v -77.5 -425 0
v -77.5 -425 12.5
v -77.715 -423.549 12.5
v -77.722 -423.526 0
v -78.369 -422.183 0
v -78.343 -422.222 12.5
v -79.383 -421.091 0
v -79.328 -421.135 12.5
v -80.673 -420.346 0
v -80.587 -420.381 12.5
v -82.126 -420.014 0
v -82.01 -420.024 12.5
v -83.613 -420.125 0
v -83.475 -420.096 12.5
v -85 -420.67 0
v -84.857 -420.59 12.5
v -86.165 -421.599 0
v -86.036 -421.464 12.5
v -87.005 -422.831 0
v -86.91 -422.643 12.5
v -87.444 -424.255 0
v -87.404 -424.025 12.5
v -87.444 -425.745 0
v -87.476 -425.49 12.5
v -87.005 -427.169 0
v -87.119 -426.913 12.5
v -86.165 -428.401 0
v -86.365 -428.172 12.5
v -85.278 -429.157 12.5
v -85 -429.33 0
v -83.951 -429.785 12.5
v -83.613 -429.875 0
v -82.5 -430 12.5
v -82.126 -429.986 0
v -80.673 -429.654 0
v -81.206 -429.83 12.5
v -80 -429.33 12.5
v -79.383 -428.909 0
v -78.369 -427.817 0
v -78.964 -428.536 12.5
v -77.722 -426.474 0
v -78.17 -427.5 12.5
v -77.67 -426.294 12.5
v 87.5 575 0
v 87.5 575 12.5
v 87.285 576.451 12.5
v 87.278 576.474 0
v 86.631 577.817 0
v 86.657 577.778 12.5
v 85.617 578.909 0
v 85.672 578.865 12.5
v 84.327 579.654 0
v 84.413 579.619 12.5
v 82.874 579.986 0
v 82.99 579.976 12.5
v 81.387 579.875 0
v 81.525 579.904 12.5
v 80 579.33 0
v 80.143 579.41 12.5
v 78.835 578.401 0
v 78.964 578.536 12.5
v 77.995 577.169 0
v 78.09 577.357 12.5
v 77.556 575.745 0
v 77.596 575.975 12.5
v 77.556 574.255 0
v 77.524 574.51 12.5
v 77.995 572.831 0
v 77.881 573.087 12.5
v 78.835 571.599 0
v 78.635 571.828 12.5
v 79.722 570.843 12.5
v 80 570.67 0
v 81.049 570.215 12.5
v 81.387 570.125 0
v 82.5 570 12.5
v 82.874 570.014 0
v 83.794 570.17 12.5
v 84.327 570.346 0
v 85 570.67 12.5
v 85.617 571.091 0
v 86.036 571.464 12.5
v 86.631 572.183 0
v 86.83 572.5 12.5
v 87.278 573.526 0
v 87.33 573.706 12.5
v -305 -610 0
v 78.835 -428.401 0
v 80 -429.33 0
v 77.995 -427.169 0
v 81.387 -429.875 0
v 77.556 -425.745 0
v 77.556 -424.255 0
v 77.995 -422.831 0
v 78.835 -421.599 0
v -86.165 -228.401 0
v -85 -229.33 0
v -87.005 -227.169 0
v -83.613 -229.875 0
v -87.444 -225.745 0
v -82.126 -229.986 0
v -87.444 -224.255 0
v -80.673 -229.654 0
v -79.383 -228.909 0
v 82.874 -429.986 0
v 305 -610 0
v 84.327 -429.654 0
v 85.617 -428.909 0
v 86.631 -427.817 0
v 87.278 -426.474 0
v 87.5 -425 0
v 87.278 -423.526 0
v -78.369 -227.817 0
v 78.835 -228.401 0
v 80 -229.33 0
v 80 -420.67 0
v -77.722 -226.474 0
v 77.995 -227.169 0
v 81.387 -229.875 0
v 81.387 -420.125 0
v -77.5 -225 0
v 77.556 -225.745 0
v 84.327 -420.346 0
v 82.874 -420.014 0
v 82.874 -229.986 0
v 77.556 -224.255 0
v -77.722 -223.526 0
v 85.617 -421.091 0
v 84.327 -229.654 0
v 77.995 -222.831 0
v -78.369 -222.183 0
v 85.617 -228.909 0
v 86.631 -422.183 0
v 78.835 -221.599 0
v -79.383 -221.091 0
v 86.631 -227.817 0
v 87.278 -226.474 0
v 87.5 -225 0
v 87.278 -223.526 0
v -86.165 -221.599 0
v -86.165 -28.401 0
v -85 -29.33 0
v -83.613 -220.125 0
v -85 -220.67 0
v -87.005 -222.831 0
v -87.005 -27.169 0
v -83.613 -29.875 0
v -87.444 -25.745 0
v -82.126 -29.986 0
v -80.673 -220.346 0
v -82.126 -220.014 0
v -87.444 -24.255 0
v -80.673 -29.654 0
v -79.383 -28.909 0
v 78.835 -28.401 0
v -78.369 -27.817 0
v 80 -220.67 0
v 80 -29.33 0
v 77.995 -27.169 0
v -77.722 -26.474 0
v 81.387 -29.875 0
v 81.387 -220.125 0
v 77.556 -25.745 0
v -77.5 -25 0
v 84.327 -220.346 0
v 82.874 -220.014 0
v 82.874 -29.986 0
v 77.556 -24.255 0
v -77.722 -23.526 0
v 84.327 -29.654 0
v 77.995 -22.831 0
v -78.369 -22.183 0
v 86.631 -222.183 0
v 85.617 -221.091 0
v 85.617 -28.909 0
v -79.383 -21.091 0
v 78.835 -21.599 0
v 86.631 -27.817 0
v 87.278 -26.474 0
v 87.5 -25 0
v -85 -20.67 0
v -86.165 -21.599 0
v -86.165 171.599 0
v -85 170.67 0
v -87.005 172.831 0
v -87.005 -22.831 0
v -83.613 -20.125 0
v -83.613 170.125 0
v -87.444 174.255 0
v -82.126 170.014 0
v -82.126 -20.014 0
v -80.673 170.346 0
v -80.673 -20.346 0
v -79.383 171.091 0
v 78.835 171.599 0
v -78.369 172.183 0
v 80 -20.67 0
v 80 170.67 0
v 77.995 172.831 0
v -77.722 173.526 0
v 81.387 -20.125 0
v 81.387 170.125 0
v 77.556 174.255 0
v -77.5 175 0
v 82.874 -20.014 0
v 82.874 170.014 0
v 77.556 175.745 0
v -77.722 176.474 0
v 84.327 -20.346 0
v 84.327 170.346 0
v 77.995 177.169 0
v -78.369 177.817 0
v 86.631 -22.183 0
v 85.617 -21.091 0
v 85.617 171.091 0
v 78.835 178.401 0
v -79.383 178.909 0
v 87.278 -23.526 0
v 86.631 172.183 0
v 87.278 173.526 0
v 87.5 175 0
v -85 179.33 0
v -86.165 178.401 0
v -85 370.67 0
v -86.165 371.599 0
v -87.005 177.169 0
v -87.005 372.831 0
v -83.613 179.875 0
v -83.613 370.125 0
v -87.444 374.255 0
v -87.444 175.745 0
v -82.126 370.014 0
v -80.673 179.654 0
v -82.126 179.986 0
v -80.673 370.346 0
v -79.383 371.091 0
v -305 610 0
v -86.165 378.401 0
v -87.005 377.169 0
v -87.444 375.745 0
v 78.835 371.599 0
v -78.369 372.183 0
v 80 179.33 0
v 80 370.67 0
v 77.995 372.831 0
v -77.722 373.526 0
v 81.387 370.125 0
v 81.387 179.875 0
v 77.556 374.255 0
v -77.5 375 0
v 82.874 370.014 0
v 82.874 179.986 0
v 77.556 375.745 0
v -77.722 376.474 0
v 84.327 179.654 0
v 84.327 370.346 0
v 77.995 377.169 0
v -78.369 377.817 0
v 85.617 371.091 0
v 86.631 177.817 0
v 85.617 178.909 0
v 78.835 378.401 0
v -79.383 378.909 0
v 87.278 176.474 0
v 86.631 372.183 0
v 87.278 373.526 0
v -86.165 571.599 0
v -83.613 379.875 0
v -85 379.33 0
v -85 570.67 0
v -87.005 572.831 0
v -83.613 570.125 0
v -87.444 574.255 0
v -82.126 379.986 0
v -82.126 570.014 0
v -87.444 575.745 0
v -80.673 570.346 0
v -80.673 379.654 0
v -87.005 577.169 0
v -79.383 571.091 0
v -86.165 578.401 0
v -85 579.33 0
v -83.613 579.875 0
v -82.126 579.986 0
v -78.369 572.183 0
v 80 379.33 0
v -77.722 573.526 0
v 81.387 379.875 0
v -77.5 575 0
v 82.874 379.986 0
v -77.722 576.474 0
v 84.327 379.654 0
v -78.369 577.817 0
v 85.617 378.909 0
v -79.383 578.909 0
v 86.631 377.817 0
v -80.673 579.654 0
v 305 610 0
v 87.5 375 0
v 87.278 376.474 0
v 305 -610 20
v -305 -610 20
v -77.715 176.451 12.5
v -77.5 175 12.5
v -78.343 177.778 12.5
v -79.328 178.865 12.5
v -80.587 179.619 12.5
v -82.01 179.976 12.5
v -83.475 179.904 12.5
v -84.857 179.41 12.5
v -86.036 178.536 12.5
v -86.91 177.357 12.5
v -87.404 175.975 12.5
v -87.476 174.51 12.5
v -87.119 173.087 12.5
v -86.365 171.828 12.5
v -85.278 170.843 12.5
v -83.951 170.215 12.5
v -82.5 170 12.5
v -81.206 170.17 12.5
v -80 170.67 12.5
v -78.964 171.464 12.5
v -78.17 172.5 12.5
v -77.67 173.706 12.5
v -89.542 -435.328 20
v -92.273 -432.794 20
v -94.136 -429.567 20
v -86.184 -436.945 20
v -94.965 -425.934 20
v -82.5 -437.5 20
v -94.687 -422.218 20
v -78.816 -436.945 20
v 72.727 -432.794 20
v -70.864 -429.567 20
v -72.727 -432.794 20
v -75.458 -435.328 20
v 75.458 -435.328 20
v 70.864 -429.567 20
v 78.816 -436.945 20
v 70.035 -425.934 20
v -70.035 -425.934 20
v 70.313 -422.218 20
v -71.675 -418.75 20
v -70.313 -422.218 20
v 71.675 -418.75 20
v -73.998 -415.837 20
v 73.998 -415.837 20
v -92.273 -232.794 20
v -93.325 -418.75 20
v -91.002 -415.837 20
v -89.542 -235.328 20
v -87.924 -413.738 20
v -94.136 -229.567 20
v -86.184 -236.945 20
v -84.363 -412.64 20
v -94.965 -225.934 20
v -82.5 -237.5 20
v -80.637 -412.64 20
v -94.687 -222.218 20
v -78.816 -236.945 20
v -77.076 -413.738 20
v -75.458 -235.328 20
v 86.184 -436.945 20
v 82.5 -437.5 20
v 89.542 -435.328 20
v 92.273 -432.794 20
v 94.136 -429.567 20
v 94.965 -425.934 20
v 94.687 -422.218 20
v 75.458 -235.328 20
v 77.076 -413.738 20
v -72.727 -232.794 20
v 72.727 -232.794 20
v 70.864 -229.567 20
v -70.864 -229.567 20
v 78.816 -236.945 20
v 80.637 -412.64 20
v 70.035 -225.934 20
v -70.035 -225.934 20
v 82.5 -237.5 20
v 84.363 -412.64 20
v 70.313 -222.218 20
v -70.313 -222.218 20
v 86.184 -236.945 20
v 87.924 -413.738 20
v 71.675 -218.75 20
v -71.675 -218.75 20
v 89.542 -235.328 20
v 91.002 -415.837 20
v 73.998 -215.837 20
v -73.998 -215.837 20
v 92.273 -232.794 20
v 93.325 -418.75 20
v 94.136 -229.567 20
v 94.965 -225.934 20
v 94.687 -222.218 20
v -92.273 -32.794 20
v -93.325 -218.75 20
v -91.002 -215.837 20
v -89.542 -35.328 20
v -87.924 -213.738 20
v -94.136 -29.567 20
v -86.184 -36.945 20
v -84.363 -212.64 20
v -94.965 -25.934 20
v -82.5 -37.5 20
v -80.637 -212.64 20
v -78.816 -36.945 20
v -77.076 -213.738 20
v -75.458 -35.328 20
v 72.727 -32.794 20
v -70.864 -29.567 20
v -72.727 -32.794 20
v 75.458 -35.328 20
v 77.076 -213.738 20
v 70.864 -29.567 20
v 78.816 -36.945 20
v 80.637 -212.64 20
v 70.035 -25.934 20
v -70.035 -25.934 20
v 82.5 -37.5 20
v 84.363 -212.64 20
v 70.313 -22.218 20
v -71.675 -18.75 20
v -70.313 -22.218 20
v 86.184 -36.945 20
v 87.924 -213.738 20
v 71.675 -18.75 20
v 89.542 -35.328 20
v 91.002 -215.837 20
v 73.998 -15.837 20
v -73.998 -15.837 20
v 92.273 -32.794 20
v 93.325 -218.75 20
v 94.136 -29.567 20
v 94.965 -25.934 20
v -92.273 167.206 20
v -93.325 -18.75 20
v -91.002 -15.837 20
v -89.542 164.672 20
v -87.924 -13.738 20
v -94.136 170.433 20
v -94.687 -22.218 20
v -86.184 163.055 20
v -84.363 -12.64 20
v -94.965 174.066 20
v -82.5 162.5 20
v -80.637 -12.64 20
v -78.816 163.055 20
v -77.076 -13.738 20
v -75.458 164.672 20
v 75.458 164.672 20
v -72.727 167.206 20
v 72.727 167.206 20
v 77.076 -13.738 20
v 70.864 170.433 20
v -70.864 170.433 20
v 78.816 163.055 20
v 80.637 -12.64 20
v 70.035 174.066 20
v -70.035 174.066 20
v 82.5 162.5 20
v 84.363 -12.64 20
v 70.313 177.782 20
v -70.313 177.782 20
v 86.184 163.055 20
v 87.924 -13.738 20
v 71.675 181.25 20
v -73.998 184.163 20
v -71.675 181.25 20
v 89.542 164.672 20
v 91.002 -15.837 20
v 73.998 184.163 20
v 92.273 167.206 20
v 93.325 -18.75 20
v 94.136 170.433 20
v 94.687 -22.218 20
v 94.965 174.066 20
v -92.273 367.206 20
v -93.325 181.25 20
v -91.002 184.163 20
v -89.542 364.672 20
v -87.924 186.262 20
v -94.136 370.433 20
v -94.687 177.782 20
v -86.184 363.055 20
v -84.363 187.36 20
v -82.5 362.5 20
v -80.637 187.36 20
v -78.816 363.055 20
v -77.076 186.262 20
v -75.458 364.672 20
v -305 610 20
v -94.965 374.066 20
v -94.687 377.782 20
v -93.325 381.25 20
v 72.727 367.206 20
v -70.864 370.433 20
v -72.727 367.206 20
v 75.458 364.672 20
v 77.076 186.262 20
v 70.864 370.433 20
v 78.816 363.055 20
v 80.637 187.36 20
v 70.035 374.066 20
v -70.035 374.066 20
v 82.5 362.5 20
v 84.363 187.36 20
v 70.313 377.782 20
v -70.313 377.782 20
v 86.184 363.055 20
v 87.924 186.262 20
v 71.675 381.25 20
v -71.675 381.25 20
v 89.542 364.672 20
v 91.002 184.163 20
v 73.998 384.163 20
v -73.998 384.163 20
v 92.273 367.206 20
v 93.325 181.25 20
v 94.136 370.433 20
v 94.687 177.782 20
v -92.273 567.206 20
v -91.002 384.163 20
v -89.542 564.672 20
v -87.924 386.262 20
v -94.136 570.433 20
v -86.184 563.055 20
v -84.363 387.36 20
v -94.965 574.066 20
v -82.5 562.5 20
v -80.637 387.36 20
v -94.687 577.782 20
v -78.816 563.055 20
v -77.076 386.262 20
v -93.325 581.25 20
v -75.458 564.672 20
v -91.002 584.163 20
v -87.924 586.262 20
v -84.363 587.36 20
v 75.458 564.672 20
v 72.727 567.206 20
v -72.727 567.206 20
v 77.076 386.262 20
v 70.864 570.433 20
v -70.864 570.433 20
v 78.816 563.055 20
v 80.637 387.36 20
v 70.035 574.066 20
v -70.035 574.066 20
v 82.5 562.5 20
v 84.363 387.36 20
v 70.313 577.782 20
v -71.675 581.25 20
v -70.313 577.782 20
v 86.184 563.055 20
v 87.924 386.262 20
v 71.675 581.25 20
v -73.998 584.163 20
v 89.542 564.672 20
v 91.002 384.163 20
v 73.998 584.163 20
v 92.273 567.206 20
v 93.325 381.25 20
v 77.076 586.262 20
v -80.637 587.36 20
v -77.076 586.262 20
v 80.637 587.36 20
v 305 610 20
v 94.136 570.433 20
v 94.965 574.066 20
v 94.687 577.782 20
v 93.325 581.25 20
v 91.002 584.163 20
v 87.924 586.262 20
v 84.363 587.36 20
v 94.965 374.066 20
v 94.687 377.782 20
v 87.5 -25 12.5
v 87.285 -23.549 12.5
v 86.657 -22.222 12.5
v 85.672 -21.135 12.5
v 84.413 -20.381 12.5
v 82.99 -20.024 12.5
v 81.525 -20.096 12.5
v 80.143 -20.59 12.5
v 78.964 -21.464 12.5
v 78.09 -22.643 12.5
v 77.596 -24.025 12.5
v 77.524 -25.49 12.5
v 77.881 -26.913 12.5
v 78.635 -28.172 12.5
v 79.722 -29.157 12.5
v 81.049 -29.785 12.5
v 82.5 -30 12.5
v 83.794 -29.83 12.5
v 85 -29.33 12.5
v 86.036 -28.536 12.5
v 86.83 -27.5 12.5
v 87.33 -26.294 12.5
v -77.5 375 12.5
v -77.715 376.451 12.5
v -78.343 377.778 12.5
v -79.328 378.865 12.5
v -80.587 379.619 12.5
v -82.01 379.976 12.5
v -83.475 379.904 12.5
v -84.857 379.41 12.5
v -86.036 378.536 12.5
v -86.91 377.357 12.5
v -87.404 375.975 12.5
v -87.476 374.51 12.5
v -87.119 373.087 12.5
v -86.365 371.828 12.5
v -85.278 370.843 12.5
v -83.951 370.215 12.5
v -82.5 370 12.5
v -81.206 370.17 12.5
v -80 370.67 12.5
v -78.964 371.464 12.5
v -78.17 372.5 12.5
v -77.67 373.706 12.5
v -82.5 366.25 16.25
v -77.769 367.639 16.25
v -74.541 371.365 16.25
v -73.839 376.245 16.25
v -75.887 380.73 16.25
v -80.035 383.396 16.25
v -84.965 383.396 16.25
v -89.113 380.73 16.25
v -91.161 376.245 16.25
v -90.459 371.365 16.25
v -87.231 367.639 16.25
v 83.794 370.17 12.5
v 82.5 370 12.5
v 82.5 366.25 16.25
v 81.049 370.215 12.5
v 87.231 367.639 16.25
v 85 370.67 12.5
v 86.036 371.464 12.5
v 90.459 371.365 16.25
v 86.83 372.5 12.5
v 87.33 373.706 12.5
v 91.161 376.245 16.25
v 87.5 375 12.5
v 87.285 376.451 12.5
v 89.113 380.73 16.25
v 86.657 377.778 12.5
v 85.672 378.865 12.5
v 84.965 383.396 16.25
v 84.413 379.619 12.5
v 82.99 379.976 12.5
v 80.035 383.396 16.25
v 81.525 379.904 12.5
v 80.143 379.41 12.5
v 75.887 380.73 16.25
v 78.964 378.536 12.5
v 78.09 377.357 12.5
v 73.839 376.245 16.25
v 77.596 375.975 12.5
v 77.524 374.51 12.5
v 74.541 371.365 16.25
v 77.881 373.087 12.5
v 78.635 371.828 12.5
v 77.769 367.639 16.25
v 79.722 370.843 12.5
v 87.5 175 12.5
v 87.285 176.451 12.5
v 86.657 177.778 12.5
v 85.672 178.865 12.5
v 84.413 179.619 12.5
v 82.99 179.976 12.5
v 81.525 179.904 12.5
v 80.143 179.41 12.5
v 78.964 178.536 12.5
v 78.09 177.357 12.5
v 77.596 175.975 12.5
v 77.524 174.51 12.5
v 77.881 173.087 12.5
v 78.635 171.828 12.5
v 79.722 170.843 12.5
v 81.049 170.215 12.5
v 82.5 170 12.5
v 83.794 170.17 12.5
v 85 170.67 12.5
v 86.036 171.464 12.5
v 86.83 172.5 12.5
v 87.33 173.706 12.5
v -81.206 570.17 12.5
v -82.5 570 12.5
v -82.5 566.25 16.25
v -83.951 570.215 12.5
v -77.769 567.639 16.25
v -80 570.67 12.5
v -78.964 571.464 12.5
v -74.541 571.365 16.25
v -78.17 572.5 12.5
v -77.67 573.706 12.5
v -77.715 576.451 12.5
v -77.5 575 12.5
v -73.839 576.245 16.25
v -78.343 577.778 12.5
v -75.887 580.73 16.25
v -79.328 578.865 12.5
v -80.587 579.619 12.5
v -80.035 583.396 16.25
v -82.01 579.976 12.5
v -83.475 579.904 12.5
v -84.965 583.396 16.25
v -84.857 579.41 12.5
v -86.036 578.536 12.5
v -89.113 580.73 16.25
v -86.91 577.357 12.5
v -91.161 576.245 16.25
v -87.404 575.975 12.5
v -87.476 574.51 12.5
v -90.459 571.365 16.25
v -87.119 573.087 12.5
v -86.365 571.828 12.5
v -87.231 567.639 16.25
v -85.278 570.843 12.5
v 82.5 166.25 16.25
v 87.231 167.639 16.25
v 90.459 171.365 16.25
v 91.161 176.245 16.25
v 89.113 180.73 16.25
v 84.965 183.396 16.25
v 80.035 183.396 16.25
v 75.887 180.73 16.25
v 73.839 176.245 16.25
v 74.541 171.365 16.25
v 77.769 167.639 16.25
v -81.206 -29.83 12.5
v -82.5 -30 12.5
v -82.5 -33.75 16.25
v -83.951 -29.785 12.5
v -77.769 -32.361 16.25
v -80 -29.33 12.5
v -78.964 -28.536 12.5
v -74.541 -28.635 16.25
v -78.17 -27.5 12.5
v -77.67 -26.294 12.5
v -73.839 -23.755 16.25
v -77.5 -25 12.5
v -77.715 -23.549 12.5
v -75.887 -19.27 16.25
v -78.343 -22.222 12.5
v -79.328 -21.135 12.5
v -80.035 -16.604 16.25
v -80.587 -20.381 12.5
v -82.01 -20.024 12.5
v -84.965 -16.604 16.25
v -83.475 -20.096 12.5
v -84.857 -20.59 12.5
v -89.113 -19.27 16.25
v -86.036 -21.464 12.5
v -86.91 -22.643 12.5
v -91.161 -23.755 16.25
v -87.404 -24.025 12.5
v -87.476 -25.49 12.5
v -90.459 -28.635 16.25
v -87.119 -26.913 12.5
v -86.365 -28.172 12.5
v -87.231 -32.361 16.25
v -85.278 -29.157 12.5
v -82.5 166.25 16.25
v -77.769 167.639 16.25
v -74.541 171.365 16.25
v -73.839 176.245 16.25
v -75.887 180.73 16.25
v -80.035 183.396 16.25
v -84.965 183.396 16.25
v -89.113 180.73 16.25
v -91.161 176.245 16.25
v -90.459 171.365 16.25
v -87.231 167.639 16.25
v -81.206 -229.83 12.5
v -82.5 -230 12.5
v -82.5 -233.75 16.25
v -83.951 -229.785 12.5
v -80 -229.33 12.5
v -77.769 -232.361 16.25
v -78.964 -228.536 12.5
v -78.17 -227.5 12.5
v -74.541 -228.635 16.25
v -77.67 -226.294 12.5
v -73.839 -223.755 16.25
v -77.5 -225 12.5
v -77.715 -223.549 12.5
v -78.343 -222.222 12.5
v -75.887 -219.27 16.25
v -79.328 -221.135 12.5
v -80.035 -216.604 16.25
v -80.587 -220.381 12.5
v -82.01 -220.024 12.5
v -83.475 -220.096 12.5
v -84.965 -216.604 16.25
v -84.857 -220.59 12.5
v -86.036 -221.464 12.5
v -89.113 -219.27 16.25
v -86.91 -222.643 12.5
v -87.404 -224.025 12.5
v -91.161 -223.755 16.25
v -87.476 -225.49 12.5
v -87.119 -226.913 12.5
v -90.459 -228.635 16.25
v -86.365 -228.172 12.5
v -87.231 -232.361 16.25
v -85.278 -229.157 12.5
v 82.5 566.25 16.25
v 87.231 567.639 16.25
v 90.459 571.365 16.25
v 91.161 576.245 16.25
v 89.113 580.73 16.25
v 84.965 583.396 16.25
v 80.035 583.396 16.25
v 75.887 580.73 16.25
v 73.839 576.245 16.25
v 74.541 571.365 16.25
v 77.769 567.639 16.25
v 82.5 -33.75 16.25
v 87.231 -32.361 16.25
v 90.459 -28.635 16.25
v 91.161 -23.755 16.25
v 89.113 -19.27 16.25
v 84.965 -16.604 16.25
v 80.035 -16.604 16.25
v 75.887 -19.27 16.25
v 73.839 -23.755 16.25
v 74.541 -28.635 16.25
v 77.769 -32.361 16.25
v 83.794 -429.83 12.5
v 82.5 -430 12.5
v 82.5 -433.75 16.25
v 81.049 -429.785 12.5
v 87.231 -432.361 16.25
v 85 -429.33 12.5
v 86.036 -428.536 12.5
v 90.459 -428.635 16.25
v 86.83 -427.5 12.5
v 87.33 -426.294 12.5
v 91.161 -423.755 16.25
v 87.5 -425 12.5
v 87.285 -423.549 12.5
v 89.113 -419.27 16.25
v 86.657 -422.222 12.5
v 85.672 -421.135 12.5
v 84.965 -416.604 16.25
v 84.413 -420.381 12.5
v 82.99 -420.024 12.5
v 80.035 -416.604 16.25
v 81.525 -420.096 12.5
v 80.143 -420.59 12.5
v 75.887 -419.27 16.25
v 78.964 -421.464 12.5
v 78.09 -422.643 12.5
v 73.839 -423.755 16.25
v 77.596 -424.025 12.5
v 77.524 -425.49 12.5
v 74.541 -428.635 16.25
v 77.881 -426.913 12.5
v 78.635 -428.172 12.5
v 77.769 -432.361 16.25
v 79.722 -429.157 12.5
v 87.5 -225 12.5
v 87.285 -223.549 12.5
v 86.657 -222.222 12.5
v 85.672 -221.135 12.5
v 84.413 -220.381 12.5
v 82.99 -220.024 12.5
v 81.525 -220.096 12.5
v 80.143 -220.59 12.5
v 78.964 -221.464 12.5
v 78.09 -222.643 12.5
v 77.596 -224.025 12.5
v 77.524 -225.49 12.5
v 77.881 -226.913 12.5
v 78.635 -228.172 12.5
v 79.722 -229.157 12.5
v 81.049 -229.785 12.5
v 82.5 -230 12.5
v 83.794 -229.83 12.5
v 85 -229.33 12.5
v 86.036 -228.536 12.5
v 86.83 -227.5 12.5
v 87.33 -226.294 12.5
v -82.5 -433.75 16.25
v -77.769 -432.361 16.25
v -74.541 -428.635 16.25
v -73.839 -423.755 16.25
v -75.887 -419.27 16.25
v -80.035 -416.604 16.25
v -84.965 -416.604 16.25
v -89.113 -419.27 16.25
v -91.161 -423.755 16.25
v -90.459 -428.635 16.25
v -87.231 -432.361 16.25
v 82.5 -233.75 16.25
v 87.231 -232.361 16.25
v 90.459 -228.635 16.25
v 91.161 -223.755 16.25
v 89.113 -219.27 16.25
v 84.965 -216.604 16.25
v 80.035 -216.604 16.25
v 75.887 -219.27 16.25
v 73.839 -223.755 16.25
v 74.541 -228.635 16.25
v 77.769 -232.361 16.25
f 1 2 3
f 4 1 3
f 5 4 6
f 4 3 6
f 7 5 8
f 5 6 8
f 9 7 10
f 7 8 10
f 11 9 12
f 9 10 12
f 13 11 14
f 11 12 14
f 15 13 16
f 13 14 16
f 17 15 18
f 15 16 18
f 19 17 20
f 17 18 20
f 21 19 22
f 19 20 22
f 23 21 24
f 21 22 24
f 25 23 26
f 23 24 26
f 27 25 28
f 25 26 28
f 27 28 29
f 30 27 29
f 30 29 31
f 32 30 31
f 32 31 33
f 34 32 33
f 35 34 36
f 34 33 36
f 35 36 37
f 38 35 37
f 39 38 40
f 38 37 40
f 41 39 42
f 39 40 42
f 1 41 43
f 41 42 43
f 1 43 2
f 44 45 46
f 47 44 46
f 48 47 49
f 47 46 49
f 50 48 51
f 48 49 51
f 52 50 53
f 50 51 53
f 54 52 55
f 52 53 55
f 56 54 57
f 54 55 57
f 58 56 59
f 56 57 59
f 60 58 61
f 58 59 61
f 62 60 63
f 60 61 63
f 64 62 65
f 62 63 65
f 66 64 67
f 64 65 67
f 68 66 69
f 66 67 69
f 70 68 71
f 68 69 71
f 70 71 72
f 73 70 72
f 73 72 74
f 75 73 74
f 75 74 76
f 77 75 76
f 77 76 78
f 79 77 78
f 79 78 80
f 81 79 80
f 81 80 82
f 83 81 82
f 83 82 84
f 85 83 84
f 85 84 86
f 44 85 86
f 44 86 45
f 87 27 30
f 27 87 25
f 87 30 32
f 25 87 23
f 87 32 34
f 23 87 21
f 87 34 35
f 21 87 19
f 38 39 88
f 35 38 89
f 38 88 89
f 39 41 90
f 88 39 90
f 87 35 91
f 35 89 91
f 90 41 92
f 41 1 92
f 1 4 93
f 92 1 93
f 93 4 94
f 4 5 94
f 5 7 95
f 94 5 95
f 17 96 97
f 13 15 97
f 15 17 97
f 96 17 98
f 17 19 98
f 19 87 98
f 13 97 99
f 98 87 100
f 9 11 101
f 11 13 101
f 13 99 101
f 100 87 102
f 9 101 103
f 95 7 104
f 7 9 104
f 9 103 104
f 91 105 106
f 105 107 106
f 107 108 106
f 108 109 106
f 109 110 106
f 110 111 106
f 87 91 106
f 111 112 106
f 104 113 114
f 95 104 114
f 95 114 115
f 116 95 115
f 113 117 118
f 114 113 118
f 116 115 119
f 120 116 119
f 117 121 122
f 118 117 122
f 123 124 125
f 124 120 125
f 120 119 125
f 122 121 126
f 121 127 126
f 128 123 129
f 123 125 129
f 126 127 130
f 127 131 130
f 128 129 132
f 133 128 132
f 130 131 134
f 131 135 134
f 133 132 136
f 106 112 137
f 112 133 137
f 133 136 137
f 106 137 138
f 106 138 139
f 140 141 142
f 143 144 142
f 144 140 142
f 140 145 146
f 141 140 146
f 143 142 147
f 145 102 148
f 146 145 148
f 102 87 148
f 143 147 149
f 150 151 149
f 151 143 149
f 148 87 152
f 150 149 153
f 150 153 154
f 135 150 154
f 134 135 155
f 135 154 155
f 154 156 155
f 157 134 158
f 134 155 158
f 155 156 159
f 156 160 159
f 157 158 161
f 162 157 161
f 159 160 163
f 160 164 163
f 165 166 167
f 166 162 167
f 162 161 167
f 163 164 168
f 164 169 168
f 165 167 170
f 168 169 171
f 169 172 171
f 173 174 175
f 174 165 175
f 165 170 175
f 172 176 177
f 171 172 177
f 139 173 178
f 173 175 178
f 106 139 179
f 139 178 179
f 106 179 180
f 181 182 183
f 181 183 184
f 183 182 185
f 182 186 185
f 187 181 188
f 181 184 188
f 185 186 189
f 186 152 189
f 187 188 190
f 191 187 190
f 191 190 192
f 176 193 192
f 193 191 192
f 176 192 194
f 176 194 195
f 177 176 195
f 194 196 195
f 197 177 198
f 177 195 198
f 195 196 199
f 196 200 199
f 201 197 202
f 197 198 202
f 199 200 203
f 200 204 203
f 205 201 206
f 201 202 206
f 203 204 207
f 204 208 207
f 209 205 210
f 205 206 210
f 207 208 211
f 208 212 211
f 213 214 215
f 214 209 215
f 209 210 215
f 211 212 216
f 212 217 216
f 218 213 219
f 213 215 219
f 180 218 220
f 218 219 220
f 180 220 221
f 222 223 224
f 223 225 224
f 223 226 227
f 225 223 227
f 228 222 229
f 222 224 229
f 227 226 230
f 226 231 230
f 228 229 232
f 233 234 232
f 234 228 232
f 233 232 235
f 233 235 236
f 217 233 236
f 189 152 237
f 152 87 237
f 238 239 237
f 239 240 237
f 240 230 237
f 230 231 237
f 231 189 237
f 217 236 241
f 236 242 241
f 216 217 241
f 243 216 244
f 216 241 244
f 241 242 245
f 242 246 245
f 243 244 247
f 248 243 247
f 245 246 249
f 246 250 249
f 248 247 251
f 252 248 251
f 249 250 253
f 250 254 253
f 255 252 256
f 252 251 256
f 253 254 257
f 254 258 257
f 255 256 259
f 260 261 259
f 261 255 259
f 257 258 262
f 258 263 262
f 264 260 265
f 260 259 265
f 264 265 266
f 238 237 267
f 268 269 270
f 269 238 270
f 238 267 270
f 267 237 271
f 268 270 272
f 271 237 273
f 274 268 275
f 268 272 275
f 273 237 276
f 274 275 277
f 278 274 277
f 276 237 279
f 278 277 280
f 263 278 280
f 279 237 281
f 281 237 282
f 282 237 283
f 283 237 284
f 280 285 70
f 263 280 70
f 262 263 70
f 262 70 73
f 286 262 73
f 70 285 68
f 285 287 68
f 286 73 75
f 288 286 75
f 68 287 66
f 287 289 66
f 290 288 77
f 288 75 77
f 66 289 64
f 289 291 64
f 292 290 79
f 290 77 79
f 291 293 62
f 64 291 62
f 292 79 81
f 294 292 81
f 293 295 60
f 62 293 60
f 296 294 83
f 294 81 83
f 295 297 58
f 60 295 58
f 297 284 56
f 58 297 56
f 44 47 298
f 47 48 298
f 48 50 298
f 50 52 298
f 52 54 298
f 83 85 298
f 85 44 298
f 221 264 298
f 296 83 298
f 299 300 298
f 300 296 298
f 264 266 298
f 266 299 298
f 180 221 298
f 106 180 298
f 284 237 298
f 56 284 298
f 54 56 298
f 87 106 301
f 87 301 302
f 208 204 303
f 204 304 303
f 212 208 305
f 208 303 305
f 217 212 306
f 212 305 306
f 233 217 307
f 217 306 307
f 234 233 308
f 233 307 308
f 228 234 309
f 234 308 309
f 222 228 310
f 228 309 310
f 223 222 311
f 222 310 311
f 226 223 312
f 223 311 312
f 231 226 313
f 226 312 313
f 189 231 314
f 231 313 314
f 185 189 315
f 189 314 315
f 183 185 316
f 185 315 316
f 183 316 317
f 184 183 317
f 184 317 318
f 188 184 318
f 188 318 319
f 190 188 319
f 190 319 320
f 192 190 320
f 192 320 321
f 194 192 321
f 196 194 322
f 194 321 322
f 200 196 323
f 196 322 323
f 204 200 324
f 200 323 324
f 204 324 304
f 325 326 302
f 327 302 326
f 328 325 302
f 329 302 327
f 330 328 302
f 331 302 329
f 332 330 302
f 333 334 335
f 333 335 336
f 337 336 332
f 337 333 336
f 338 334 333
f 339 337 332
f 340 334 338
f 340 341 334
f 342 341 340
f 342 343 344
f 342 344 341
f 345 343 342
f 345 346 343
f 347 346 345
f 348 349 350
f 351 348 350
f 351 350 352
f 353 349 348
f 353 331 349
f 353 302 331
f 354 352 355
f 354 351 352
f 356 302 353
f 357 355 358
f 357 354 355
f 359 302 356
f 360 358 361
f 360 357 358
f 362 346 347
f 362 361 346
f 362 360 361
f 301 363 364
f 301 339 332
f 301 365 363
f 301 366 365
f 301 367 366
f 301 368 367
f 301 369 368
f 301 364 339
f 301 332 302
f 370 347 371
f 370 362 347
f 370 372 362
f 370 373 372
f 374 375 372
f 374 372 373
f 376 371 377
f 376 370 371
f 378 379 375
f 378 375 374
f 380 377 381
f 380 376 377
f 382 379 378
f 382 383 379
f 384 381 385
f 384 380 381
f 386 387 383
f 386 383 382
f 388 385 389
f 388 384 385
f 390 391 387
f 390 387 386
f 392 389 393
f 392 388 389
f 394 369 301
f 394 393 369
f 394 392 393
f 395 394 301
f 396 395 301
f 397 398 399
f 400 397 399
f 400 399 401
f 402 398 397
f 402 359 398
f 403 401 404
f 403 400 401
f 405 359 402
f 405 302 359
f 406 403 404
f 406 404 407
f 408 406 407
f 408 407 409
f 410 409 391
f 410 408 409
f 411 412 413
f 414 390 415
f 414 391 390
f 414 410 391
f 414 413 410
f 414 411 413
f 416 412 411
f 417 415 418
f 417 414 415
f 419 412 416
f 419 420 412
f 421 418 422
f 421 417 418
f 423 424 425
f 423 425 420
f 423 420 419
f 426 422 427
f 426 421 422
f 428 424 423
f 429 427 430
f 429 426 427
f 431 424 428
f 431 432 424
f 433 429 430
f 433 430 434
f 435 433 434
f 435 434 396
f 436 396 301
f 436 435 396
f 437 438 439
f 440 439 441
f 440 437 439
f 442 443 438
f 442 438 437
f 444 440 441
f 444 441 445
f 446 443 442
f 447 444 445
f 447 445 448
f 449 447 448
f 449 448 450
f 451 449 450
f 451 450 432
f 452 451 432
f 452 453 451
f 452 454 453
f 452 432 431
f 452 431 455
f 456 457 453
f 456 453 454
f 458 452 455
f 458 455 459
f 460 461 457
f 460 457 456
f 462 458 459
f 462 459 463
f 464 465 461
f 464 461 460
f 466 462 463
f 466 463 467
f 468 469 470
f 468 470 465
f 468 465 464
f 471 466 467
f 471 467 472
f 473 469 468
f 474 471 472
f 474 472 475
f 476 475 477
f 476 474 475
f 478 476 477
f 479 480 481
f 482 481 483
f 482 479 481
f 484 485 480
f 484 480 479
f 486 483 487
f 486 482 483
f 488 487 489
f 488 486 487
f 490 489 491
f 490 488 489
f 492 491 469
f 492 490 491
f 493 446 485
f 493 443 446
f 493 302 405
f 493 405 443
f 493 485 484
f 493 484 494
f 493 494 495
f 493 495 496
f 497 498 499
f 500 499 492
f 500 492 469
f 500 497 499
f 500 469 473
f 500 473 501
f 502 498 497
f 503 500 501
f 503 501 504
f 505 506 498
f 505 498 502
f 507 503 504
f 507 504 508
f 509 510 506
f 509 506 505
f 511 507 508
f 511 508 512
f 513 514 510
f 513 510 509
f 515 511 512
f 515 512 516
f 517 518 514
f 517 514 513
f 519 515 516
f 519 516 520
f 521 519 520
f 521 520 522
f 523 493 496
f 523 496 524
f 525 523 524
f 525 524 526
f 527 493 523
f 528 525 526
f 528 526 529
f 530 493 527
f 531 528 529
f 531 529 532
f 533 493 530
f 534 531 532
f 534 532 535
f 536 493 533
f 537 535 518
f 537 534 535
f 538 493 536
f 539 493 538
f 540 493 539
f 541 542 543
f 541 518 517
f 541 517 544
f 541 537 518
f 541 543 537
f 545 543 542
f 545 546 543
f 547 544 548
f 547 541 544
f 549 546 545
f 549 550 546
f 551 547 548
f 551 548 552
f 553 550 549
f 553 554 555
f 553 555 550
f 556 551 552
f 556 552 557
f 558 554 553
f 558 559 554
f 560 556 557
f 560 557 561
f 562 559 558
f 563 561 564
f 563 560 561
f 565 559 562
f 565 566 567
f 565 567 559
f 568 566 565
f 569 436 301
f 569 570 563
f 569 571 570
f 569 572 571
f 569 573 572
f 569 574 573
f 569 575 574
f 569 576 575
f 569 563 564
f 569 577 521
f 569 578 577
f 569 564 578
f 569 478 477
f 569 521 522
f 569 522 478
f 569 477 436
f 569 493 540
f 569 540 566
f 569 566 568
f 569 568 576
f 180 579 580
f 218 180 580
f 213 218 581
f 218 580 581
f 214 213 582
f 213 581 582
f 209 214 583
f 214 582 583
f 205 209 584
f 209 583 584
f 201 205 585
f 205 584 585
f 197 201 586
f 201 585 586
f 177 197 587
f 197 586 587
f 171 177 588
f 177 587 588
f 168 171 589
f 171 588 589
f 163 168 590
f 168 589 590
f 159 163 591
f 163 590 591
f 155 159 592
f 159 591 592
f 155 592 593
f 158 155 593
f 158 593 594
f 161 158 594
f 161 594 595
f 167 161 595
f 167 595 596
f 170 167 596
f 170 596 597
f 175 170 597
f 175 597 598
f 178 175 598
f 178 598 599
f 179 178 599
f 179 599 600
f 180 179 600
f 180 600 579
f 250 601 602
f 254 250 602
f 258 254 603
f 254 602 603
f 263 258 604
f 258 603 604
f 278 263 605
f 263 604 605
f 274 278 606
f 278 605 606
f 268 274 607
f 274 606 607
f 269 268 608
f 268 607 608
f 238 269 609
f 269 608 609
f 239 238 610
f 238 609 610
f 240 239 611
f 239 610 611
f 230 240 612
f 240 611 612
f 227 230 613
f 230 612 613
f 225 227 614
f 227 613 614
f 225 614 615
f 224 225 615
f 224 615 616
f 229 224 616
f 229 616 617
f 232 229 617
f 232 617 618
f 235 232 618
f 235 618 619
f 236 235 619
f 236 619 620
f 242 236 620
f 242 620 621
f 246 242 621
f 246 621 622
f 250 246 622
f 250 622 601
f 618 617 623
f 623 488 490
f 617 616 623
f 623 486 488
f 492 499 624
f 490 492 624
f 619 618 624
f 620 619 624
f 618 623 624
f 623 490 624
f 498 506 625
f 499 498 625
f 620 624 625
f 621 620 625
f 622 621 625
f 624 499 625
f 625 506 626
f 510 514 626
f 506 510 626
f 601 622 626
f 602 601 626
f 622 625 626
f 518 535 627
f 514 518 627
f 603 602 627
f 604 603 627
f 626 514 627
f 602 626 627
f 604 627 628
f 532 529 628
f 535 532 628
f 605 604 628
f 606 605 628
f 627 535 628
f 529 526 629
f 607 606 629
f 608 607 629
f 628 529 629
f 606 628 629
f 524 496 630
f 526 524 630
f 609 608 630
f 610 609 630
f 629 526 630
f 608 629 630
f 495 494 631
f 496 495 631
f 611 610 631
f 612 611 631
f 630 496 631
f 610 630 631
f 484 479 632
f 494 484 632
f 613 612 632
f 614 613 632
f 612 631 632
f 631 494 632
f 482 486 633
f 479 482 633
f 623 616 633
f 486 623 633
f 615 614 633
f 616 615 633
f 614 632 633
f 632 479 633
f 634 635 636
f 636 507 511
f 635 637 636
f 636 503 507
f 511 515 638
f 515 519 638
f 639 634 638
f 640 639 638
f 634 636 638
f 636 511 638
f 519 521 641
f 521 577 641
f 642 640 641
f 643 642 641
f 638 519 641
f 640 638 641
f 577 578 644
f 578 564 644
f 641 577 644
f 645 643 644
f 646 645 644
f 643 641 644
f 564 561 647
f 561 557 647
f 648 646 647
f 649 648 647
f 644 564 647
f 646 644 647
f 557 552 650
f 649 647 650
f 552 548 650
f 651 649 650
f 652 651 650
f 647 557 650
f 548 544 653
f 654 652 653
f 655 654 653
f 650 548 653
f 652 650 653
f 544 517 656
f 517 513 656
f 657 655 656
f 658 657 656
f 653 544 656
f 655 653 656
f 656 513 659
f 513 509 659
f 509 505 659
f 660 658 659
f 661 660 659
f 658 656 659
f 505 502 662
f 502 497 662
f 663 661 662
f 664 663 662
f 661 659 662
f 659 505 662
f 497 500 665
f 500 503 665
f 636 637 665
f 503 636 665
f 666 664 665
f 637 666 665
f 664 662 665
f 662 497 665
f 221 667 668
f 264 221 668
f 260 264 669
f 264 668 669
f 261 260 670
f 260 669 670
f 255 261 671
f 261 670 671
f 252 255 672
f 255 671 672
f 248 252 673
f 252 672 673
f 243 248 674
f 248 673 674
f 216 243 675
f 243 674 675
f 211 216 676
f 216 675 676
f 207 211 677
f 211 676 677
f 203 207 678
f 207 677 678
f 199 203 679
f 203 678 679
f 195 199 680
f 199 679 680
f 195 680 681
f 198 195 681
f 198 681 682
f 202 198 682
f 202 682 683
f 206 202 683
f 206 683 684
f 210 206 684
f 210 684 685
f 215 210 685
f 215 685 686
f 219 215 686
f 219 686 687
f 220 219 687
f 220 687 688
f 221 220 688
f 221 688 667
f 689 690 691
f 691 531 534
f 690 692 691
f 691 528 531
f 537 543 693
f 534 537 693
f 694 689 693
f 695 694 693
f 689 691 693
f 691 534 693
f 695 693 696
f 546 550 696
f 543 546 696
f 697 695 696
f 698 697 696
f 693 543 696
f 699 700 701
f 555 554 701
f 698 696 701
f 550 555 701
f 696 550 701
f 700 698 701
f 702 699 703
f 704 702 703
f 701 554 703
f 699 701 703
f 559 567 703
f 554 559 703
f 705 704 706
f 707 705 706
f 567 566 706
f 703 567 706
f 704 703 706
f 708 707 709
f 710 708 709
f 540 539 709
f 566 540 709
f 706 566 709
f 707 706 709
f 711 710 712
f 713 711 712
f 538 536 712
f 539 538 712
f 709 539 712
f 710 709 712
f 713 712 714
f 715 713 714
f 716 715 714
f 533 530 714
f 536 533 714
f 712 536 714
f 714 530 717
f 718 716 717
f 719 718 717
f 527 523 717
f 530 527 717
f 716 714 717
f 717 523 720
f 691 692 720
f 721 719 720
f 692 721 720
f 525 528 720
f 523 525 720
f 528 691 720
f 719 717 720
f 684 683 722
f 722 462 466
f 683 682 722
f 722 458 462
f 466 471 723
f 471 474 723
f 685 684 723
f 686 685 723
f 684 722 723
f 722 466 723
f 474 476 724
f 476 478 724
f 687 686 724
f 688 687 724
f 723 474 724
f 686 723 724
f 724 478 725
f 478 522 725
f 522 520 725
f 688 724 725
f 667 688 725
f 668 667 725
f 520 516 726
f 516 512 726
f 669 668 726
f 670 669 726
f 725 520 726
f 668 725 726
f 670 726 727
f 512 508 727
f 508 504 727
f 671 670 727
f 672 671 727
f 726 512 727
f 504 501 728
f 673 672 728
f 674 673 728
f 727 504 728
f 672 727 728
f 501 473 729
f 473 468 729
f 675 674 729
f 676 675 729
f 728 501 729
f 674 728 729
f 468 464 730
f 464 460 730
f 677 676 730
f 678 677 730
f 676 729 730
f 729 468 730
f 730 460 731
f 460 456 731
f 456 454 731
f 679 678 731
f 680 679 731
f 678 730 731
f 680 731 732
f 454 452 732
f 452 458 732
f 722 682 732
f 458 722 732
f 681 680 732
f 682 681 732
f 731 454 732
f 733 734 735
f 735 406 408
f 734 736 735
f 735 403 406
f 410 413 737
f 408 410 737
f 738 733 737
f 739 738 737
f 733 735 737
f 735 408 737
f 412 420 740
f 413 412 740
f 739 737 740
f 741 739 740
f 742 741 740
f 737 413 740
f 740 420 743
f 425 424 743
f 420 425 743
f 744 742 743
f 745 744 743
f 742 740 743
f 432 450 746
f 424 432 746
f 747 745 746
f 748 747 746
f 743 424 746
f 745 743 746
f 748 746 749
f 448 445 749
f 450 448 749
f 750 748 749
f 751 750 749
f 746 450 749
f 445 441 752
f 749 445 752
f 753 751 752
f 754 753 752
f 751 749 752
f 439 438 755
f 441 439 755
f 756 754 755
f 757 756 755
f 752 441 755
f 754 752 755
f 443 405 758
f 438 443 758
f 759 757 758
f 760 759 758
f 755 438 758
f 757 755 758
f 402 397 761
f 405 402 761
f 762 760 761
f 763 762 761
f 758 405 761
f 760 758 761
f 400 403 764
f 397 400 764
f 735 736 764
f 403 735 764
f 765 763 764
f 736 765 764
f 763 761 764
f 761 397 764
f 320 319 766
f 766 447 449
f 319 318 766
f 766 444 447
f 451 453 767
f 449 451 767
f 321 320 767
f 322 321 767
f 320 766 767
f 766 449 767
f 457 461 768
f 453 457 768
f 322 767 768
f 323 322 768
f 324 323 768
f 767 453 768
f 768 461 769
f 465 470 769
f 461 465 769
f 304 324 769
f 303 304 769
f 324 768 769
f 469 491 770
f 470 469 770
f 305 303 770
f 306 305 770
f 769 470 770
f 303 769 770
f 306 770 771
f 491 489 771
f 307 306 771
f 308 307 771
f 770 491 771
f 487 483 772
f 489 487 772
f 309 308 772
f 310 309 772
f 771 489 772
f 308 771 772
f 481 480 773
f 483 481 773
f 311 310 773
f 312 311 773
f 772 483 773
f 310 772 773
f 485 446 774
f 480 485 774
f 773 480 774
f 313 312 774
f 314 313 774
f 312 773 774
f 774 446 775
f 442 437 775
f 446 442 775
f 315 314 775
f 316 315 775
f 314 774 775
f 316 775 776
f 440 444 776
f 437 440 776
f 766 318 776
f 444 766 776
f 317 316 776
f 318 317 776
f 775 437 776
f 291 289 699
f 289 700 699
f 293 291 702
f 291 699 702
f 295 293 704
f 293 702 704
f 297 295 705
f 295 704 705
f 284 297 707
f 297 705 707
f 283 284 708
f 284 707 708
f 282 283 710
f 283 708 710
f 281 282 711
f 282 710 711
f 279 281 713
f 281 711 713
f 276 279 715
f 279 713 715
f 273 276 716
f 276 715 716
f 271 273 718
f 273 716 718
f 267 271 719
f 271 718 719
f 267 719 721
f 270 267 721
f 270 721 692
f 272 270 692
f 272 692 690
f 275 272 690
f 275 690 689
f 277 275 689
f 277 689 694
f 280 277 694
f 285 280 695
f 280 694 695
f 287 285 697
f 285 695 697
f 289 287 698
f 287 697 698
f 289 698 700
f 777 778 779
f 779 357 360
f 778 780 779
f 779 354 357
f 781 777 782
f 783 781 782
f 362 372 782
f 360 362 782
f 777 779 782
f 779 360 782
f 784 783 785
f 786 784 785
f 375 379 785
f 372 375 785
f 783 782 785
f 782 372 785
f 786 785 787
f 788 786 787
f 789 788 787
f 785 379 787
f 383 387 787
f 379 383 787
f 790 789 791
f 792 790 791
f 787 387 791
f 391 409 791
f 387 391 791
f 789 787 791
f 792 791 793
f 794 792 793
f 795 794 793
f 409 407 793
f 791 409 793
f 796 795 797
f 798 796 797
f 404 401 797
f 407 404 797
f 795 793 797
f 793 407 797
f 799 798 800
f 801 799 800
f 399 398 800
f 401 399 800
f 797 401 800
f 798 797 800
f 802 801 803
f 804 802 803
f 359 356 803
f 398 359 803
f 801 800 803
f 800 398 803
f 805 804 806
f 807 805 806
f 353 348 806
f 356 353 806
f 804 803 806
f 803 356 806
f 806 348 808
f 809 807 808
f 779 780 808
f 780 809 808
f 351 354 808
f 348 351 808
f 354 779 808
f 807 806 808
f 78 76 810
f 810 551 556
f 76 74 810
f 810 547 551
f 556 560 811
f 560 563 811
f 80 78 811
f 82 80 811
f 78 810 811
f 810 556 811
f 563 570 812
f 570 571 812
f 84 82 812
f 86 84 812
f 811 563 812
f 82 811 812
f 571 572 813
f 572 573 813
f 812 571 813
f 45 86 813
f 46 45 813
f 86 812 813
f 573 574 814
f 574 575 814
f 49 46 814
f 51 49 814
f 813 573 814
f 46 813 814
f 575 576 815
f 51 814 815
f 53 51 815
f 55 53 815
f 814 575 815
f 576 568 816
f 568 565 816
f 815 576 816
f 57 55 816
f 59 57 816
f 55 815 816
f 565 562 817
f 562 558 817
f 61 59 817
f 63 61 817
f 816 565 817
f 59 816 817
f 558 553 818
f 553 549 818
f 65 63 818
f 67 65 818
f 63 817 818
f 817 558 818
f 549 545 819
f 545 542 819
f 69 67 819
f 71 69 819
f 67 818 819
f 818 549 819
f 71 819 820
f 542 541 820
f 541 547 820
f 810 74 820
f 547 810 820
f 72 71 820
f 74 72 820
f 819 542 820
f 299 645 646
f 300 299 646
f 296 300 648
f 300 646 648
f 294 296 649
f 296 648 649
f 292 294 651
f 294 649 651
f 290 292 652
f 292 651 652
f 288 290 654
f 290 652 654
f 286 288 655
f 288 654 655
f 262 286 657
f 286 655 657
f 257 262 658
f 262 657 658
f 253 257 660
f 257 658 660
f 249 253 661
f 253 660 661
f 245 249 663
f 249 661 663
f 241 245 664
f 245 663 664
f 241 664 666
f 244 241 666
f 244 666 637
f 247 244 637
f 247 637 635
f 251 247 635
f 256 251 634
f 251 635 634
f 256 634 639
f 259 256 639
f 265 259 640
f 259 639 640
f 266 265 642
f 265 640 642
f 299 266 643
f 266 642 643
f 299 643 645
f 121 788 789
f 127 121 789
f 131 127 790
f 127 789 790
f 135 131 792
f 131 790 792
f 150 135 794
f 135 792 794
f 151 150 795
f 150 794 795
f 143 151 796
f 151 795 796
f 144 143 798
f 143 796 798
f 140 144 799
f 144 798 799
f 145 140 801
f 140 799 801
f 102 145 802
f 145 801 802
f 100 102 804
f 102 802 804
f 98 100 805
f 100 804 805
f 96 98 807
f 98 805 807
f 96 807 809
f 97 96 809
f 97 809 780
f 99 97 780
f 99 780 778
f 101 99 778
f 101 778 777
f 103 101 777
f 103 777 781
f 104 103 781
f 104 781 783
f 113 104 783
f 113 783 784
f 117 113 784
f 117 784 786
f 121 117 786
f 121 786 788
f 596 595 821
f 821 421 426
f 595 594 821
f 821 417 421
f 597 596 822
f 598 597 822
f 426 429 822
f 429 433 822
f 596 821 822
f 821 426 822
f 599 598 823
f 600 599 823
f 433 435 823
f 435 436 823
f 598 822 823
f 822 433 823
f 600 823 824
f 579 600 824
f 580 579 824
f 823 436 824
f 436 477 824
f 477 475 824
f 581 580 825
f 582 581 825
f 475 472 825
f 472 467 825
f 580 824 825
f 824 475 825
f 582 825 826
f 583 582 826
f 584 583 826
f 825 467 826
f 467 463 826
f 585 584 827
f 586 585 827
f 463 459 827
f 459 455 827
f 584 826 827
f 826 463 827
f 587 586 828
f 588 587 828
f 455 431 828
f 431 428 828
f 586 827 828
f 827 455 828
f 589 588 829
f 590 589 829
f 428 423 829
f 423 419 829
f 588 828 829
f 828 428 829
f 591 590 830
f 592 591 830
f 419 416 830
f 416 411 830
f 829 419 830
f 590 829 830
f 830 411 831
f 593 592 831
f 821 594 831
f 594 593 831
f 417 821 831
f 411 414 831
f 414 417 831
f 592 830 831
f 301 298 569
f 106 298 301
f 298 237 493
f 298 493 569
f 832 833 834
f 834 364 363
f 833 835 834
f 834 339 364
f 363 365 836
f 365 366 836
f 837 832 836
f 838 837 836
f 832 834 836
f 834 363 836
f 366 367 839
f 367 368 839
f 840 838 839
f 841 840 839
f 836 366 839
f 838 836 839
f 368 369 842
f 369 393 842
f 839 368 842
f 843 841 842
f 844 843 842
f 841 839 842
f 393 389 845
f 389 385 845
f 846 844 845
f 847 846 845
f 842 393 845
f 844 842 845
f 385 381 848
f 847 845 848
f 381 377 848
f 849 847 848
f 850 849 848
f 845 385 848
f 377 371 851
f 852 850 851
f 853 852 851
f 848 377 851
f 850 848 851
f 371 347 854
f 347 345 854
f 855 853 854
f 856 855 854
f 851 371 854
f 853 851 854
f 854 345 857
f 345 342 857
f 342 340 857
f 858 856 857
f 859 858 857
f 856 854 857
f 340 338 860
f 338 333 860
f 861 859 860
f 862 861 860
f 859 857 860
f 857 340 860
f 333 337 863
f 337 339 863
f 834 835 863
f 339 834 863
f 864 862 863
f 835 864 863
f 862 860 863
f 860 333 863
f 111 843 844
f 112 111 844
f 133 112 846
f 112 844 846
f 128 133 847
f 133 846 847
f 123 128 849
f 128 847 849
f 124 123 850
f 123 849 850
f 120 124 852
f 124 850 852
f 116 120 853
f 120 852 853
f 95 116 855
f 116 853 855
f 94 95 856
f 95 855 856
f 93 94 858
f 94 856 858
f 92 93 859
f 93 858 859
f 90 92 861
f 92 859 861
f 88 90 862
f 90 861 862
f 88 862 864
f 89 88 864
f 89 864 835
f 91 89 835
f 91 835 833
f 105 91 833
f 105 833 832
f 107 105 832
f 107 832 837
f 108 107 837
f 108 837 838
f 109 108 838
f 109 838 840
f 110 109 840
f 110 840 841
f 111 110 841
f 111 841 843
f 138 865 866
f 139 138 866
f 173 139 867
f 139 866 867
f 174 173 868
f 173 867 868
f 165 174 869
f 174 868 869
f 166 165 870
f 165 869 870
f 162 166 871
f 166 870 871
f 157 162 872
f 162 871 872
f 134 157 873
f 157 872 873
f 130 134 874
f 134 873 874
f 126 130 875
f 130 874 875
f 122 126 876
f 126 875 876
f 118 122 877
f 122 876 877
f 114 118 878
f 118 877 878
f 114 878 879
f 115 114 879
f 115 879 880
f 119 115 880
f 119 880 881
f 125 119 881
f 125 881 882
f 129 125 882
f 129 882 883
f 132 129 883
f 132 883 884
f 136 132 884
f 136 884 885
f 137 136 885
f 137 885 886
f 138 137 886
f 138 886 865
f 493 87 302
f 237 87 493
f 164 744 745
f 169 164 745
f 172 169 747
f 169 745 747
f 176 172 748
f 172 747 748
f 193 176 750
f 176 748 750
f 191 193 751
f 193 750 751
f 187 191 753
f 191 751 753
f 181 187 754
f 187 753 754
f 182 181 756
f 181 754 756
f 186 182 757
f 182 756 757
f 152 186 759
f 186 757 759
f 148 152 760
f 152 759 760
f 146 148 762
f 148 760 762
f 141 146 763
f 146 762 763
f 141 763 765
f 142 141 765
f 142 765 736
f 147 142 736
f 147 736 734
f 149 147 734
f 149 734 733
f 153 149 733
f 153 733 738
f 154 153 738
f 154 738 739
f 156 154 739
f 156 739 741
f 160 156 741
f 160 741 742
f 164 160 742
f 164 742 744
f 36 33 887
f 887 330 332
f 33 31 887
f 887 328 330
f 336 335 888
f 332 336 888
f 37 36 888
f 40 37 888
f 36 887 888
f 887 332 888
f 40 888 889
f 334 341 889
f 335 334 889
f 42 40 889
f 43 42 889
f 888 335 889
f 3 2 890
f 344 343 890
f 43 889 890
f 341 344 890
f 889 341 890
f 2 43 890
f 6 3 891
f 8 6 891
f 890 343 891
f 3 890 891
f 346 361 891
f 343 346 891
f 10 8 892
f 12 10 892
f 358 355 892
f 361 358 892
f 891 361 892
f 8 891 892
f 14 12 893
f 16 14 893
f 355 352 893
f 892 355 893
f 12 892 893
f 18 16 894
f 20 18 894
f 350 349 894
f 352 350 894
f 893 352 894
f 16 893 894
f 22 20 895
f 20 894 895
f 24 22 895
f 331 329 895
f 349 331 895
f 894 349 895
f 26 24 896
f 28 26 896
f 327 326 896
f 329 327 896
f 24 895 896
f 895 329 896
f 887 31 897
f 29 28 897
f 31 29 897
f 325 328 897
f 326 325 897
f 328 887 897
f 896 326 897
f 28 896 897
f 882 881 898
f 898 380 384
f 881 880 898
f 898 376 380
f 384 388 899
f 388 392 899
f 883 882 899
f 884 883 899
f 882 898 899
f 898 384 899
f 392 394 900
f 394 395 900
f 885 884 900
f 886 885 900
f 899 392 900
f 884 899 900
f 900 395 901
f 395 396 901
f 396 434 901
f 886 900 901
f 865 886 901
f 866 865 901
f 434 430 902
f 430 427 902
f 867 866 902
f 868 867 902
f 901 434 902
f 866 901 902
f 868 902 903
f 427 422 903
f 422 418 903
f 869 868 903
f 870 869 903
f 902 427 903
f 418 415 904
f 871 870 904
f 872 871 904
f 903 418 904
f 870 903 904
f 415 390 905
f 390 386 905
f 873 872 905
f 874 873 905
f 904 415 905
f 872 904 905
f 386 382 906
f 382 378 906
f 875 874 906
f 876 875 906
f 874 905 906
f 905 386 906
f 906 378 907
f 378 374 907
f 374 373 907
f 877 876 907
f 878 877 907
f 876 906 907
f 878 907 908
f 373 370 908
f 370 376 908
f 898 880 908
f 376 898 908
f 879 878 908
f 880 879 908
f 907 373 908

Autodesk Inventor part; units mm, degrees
ref_plane "YZ Plane" through (0, 0, 0) normal (1, 0, 0) x (0, 1, 0)
ref_plane "XZ Plane" through (0, 0, 0) normal (0, 1, 0) x (-1, 0, 0)
ref_plane "XY Plane" through (0, 0, 0) normal (0, 0, 1) x (1, 0, 0)
sketch "Sketch1" plane through (0, 0, 0) normal (0, 0, 1) x (1, 0, 0)
  line L0 (-305, 610) -> (305, 610)
  line L1 (305, 610) -> (305, -610)
  line L2 (305, -610) -> (-305, -610)
  line L3 (-305, -610) -> (-305, 610)
  line L4 (-305, 610) -> (305, -610) construction
  line L5 (305, 610) -> (-305, -610) construction
  point P0 (0, 0)
  dimension "d0" = 610
  dimension "d1" = 1220
extrude "Extrusion1" add sketch "Sketch1" along normal blind 20
sketch "Sketch2" plane through (0, 0, 20) normal (0, 0, 1) x (1, 0, 0)
  circle A0 centre (82.5, 575) radius 5 projected
  circle A1 centre (82.5, -25) radius 5 projected
  circle A2 centre (82.5, 375) radius 5 projected
  circle A3 centre (82.5, -225) radius 5 projected
  circle A4 centre (82.5, 175) radius 5 projected
  arc A5 (92.5, -250) -> (97.5, -245) centre (92.5, -245) ccw projected
  line L0 (69.5, -250) -> (92.5, -250) projected
  line L1 (69.5, -250) -> (69.5, 600) projected
  line L2 (92.5, 600) -> (69.5, 600) projected
  arc A6 (97.5, 595) -> (92.5, 600) centre (92.5, 595) ccw projected
  line L3 (97.5, -245) -> (97.5, 595) projected
  circle A7 centre (-82.5, 575) radius 5 projected
  circle A8 centre (-82.5, -25) radius 5 projected
  circle A9 centre (-82.5, 375) radius 5 projected
  circle A10 centre (-82.5, -225) radius 5 projected
  circle A11 centre (-82.5, 175) radius 5 projected
  arc A12 (-97.5, -245) -> (-92.5, -250) centre (-92.5, -245) ccw projected
  line L4 (-97.5, 595) -> (-97.5, -245) projected
  arc A13 (-92.5, 600) -> (-97.5, 595) centre (-92.5, 595) ccw projected
  line L5 (-69.5, 600) -> (-92.5, 600) projected
  line L6 (-69.5, -250) -> (-69.5, 600) projected
  line L7 (-92.5, -250) -> (-69.5, -250) projected
  point P0 (0, 0)
extrude "Extrusion2" cut sketch "Sketch2" against normal through all contours A0 | A1 | A2 | A3 | A4 | A7 | A8 | A9 | A10 | A11
sketch "Sketch3" plane through (0, 0, 20) normal (0, 0, 1) x (1, 0, 0)
  circle A0 centre (-82.5, 575) radius 5 projected
  point P0 (0, 0)
hole "Hole1" at (-82.5, 575, 20) direction (0, 0, -1) diameter 8 end through all countersink diameter 25 countersink angle 90
mirror "Mirror1" about plane through (0, 0, 0) normal (1, 0, 0) of "Hole1"
pattern_linear "Rectangular Pattern1" count 6 spacing 200 along (0, -1, 0) of "Hole1", "Mirror1"
sketch "Sketch4" plane through (0, 0, 20) normal (0, 0, 1) x (1, 0, 0)
  circle A0 centre (82.5, -425) radius 5 projected
  circle A1 centre (-82.5, -425) radius 5 projected
  point P0 (0, 0)
extrude "Extrusion3" cut sketch "Sketch4" against normal through all
equation "\"BendRadius\" = Thickness"
equation "\"BendReliefWidth\" = Thickness"
equation "\"BendReliefDepth\" = 0.5 * Thickness"
equation "\"CornerReliefSize\" = 4 * Thickness"
equation "\"MinimumRemnant\" = 2 * Thickness"
equation "\"TransitionRadius\" = BendRadius"
equation "\"JacobiRadiusSize\" = Thickness"
equation "\"GapSize\" = Thickness"
equation "\"Thickness\" = 0.5"
properties part number "IMS-00-003" material "Wood (Birch)"
